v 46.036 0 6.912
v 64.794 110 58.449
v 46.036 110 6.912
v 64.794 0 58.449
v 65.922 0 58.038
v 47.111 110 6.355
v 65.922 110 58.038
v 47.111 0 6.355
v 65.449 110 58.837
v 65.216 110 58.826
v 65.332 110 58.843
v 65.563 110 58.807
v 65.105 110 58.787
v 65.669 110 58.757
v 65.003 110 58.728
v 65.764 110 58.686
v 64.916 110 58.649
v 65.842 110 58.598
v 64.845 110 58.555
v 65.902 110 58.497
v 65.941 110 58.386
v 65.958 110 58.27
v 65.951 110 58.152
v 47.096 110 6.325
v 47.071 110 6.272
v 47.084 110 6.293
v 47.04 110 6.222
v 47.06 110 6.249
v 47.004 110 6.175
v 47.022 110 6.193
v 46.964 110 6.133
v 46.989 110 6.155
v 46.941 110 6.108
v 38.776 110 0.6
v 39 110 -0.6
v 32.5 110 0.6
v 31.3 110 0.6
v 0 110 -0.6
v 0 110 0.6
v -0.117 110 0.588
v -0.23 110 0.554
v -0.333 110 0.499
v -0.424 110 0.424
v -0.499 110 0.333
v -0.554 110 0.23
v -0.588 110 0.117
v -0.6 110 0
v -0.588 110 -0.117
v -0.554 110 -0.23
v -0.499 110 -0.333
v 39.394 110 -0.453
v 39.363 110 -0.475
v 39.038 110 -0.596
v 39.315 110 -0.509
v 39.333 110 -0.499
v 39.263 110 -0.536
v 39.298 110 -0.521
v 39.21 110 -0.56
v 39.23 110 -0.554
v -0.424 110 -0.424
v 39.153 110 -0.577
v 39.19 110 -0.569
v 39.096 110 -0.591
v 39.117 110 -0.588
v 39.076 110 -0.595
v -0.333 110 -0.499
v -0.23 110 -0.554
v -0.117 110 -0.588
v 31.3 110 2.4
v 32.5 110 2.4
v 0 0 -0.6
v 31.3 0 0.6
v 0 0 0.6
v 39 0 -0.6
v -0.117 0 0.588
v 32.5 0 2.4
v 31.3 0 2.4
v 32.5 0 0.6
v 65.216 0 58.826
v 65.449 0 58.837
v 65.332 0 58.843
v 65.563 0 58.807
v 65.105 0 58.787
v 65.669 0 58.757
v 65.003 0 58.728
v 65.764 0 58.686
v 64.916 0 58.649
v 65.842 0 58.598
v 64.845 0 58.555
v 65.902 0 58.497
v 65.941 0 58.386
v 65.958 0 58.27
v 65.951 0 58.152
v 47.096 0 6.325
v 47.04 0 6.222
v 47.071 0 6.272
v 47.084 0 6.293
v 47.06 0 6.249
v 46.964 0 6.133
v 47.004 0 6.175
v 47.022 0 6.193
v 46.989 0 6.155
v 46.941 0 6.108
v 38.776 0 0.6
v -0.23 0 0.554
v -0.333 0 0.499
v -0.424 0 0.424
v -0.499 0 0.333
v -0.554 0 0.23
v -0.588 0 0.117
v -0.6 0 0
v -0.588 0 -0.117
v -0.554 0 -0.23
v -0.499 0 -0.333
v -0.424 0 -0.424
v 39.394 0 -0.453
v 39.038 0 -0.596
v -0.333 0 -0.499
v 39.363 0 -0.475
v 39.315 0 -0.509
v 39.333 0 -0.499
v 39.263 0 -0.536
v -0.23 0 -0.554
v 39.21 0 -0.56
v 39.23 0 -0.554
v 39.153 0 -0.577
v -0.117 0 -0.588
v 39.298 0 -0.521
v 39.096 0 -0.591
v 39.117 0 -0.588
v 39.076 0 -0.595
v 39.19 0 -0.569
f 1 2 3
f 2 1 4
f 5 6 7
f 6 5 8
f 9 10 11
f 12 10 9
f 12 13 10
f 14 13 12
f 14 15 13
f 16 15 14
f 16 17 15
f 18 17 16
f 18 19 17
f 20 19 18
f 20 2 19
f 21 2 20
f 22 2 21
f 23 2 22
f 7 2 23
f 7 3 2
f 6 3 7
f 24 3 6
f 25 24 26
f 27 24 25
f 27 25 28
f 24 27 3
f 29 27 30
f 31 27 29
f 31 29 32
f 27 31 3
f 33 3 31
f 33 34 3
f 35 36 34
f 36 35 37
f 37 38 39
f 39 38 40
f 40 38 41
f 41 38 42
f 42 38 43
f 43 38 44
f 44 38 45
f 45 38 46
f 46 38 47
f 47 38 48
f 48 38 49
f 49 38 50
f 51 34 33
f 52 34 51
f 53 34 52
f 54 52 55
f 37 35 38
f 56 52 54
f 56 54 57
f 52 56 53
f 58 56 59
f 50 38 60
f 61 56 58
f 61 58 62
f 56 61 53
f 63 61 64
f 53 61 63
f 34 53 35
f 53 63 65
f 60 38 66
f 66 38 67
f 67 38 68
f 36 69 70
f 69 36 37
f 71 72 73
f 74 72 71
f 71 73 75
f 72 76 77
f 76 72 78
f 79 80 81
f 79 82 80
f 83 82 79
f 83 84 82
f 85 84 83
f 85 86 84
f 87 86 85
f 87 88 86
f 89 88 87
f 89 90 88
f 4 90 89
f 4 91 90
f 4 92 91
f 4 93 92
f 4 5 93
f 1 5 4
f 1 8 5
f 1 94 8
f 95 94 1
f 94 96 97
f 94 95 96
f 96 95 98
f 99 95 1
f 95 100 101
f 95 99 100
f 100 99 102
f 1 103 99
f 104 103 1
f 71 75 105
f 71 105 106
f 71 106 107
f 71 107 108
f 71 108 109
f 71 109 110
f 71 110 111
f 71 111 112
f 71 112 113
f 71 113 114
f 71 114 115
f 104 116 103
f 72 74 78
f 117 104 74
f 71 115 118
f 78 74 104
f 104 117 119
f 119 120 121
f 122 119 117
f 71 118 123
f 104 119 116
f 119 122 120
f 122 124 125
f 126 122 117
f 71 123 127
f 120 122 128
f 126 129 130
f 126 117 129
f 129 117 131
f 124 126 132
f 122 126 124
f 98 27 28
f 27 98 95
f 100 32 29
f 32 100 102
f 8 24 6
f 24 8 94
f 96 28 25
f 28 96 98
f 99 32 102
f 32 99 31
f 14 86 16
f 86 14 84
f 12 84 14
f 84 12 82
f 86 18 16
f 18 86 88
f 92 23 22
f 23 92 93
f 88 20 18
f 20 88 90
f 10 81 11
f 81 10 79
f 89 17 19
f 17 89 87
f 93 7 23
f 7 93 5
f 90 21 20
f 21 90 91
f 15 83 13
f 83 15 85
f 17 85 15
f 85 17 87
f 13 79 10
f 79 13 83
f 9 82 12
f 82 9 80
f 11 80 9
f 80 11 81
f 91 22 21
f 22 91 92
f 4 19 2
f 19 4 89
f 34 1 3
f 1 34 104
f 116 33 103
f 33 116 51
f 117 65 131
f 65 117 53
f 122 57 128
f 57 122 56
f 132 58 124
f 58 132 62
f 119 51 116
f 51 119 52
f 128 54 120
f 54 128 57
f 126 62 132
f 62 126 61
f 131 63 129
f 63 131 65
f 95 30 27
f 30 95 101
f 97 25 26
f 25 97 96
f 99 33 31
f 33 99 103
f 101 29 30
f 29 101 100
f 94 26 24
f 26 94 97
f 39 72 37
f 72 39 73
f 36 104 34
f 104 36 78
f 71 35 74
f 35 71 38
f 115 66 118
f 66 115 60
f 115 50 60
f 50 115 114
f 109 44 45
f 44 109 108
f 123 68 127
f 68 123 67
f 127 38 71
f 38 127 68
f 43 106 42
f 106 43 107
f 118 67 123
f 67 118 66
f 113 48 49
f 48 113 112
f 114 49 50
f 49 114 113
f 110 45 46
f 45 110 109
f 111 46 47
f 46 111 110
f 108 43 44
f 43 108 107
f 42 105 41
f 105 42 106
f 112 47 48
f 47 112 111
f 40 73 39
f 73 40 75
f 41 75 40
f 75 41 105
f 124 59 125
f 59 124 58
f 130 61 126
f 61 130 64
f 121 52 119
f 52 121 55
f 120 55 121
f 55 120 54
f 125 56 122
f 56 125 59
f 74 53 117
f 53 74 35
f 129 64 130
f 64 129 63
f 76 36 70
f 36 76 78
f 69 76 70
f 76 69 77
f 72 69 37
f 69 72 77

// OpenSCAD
$fn = 32;

b = 110;
l1 = 50+5;
l2 = 9+1;
l3 = 44-5;
d = 1.2;
alpha1 = -35+5+1; //-55;
alpha2 = -35-5-1; //-55;

module bar(l) {
    translate([0,0,-d/2]) cube([l,b,d]);
    rotate([-90,0,0]) cylinder(d=d, h=b);
    translate([l,0,0]) rotate([-90,0,0]) cylinder(d=d, h=b);
}


translate([l3,0,0]) rotate([0,alpha2,0])
union() {
  translate([l2,0,0]) rotate([0,alpha1,0]) bar(l1);
  bar(l2);
}
bar(l3);
translate([l3-6.5-d,0,0]) cube([d,b,d+d]);
